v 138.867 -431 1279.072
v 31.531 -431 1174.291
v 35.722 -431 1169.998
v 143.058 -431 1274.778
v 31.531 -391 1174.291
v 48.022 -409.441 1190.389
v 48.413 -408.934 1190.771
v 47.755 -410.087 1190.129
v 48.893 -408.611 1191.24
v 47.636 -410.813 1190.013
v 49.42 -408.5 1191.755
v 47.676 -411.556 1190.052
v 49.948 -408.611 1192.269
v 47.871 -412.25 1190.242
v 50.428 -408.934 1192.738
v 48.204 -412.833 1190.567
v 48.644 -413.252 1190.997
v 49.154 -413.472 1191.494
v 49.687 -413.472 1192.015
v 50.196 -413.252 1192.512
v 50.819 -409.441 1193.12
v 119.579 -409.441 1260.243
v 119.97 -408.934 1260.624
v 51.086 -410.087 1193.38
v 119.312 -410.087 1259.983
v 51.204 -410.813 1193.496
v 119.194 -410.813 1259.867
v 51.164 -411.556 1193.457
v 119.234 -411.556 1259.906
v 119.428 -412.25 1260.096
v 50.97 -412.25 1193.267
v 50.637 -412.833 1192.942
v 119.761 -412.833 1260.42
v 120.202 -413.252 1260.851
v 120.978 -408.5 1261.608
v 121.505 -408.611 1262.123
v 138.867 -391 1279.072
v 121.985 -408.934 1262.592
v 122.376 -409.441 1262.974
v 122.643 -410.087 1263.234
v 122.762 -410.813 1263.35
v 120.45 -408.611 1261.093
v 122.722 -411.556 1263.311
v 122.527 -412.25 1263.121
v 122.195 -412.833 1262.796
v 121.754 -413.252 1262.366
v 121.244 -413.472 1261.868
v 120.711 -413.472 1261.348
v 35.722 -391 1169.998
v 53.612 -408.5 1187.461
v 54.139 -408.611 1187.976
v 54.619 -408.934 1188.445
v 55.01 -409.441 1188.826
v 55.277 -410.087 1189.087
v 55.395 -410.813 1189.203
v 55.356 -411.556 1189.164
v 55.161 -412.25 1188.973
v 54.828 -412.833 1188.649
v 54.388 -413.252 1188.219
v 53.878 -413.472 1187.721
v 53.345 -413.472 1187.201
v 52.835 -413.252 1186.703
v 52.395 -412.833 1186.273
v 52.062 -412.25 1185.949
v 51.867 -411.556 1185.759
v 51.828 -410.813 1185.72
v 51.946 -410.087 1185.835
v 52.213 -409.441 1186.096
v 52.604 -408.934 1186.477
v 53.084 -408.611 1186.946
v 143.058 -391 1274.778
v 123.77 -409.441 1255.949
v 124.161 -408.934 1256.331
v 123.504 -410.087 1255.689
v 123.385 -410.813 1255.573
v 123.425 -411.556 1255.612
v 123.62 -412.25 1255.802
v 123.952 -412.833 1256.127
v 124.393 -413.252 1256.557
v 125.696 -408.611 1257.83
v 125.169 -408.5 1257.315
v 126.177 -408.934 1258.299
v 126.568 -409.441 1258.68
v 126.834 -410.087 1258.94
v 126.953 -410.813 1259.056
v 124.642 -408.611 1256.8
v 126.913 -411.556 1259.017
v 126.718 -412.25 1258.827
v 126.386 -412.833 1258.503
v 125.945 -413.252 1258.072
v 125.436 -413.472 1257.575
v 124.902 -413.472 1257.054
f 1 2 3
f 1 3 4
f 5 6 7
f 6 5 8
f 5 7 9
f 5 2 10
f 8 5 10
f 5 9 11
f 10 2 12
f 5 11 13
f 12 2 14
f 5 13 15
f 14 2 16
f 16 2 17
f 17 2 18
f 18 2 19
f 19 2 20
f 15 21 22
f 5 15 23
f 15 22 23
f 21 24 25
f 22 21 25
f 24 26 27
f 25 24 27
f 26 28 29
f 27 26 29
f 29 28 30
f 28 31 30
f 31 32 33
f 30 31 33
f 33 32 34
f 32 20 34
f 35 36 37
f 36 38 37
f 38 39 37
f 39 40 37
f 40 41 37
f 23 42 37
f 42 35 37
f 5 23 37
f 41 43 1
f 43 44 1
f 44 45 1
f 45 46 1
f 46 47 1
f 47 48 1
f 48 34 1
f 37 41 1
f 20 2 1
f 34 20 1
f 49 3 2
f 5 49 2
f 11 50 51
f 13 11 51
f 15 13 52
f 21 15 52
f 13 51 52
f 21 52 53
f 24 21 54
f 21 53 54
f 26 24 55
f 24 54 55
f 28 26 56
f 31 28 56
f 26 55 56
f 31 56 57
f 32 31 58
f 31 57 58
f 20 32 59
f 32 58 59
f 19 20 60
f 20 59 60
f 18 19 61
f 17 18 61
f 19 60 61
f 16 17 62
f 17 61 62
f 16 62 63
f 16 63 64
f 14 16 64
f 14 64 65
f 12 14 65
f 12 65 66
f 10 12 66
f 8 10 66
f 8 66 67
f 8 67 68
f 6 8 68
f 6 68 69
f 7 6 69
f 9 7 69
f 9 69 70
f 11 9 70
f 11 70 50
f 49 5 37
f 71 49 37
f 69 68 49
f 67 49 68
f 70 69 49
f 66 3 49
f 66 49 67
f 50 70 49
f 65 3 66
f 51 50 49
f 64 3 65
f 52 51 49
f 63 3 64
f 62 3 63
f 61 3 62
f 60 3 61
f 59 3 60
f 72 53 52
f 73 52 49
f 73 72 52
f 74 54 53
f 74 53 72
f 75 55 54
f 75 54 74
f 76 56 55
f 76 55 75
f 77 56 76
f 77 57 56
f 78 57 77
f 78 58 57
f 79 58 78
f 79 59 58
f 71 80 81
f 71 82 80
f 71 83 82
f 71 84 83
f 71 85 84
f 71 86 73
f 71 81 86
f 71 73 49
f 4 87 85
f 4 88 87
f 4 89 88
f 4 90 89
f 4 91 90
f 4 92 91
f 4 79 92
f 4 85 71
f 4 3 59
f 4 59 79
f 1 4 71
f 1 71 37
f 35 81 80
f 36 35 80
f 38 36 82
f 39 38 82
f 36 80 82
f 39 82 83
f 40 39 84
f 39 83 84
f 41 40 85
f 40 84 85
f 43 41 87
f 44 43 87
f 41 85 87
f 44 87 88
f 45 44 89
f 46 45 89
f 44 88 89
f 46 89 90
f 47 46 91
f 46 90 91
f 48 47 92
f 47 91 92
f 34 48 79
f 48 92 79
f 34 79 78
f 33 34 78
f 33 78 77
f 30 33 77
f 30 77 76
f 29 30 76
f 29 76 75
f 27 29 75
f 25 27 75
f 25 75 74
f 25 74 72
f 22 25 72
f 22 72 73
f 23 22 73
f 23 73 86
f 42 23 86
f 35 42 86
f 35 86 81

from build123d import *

# Parameters (mm, degrees)
CIRCLE002_AS_DRAWN_R                         = 2.5
EXTRUDE004_DEPTH                             = 10
EXTRUDE004_ONTO_CIRCLE002_ROLL_ANGLE         = 135.690278
EXTRUDE004_ONTO_CIRCLE002_PITCH_ANGLE        = 0
EXTRUDE004_ONTO_CIRCLE002_PLACEMENT_ANGLE    = 90.000001
CIRCLE001_AS_DRAWN_R                         = 2.5
EXTRUDE003_DEPTH                             = 10
EXTRUDE003_ONTO_CIRCLE001_ROLL_ANGLE         = 135.690278
EXTRUDE003_ONTO_CIRCLE001_PITCH_ANGLE        = 0
EXTRUDE003_ONTO_CIRCLE001_PLACEMENT_ANGLE    = 90.000001
RECTANGLE001_AS_DRAWN_W                      = 150
RECTANGLE001_AS_DRAWN_H                      = 6
EXTRUDE002_DEPTH                             = 20
EXTRUDE002_ONTO_RECTANGLE001_ROLL_ANGLE      = 89.999995
EXTRUDE002_ONTO_RECTANGLE001_PITCH_ANGLE     = -44.309723
EXTRUDE002_ONTO_RECTANGLE001_PLACEMENT_ANGLE = 3e-06


with BuildPart() as extrude004:
    # Circle002 as drawn → Extrude004 (new)
    with BuildSketch(Plane.XY):
        Circle(CIRCLE002_AS_DRAWN_R)
    extrude(amount=-EXTRUDE004_DEPTH)


with BuildPart() as extrude004_1:
    # Extrude004 onto Circle002 roll: moved
    add(extrude004.part.rotate(Axis((0, 0, 0), (1, 0, 0)), EXTRUDE004_ONTO_CIRCLE002_ROLL_ANGLE))


with BuildPart() as extrude004_2:
    # Extrude004 onto Circle002 pitch: moved
    add(extrude004_1.part.rotate(Axis((0, 0, 0), (0, 1, 0)), EXTRUDE004_ONTO_CIRCLE002_PITCH_ANGLE))


with BuildPart() as extrude004_3:
    # Extrude004 onto Circle002 placement: moved
    add(extrude004_2.part.moved(Location((53.611526, -9.999937, 1187.461103))).rotate(Axis((53.611526, -9.999937, 1187.461103), (0, 0, 1)), EXTRUDE004_ONTO_CIRCLE002_PLACEMENT_ANGLE))


with BuildPart() as compound001:
    # Circle001 as drawn → Extrude003 (new)
    with BuildSketch(Plane.XY):
        Circle(CIRCLE001_AS_DRAWN_R)
    extrude(amount=-EXTRUDE003_DEPTH)


with BuildPart() as compound001_1:
    # Extrude003 onto Circle001 roll: moved
    add(compound001.part.rotate(Axis((0, 0, 0), (1, 0, 0)), EXTRUDE003_ONTO_CIRCLE001_ROLL_ANGLE))


with BuildPart() as compound001_2:
    # Extrude003 onto Circle001 pitch: moved
    add(compound001_1.part.rotate(Axis((0, 0, 0), (0, 1, 0)), EXTRUDE003_ONTO_CIRCLE001_PITCH_ANGLE))


with BuildPart() as compound001_3:
    # Extrude003 onto Circle001 placement: moved
    add(compound001_2.part.moved(Location((125.168938, -9.99992, 1257.314767))).rotate(Axis((125.168938, -9.99992, 1257.314767), (0, 0, 1)), EXTRUDE003_ONTO_CIRCLE001_PLACEMENT_ANGLE))

    # Compound001: union Extrude004
    add(extrude004_3.part)


with BuildPart() as compound001_4:
    # Compound001 placement: moved
    add(compound001_3.part.moved(Location((0, -401.000072, 0))))


with BuildPart() as cut001:
    # Rectangle001 as drawn → Extrude002 (new, symmetric)
    with BuildSketch(Plane.XY):
        with Locations((75, 3)):
            Rectangle(RECTANGLE001_AS_DRAWN_W, RECTANGLE001_AS_DRAWN_H)
    extrude(amount=EXTRUDE002_DEPTH, both=True)


with BuildPart() as cut001_1:
    # Extrude002 onto Rectangle001 roll: moved
    add(cut001.part.rotate(Axis((0, 0, 0), (1, 0, 0)), EXTRUDE002_ONTO_RECTANGLE001_ROLL_ANGLE))


with BuildPart() as cut001_2:
    # Extrude002 onto Rectangle001 pitch: moved
    add(cut001_1.part.rotate(Axis((0, 0, 0), (0, 1, 0)), EXTRUDE002_ONTO_RECTANGLE001_PITCH_ANGLE))


with BuildPart() as cut001_3:
    # Extrude002 onto Rectangle001 placement: moved
    add(cut001_2.part.moved(Location((35.72217, -9.99993, 1169.997685))).rotate(Axis((35.72217, -9.99993, 1169.997685), (0, 0, 1)), EXTRUDE002_ONTO_RECTANGLE001_PLACEMENT_ANGLE))


with BuildPart() as cut001_4:
    # Extrude002 placement: moved
    add(cut001_3.part.moved(Location((0, -401.000072, 0))))

    # Cut001: cut Compound001
    add(compound001_4.part, mode=Mode.SUBTRACT)


solid = cut001_4.part
